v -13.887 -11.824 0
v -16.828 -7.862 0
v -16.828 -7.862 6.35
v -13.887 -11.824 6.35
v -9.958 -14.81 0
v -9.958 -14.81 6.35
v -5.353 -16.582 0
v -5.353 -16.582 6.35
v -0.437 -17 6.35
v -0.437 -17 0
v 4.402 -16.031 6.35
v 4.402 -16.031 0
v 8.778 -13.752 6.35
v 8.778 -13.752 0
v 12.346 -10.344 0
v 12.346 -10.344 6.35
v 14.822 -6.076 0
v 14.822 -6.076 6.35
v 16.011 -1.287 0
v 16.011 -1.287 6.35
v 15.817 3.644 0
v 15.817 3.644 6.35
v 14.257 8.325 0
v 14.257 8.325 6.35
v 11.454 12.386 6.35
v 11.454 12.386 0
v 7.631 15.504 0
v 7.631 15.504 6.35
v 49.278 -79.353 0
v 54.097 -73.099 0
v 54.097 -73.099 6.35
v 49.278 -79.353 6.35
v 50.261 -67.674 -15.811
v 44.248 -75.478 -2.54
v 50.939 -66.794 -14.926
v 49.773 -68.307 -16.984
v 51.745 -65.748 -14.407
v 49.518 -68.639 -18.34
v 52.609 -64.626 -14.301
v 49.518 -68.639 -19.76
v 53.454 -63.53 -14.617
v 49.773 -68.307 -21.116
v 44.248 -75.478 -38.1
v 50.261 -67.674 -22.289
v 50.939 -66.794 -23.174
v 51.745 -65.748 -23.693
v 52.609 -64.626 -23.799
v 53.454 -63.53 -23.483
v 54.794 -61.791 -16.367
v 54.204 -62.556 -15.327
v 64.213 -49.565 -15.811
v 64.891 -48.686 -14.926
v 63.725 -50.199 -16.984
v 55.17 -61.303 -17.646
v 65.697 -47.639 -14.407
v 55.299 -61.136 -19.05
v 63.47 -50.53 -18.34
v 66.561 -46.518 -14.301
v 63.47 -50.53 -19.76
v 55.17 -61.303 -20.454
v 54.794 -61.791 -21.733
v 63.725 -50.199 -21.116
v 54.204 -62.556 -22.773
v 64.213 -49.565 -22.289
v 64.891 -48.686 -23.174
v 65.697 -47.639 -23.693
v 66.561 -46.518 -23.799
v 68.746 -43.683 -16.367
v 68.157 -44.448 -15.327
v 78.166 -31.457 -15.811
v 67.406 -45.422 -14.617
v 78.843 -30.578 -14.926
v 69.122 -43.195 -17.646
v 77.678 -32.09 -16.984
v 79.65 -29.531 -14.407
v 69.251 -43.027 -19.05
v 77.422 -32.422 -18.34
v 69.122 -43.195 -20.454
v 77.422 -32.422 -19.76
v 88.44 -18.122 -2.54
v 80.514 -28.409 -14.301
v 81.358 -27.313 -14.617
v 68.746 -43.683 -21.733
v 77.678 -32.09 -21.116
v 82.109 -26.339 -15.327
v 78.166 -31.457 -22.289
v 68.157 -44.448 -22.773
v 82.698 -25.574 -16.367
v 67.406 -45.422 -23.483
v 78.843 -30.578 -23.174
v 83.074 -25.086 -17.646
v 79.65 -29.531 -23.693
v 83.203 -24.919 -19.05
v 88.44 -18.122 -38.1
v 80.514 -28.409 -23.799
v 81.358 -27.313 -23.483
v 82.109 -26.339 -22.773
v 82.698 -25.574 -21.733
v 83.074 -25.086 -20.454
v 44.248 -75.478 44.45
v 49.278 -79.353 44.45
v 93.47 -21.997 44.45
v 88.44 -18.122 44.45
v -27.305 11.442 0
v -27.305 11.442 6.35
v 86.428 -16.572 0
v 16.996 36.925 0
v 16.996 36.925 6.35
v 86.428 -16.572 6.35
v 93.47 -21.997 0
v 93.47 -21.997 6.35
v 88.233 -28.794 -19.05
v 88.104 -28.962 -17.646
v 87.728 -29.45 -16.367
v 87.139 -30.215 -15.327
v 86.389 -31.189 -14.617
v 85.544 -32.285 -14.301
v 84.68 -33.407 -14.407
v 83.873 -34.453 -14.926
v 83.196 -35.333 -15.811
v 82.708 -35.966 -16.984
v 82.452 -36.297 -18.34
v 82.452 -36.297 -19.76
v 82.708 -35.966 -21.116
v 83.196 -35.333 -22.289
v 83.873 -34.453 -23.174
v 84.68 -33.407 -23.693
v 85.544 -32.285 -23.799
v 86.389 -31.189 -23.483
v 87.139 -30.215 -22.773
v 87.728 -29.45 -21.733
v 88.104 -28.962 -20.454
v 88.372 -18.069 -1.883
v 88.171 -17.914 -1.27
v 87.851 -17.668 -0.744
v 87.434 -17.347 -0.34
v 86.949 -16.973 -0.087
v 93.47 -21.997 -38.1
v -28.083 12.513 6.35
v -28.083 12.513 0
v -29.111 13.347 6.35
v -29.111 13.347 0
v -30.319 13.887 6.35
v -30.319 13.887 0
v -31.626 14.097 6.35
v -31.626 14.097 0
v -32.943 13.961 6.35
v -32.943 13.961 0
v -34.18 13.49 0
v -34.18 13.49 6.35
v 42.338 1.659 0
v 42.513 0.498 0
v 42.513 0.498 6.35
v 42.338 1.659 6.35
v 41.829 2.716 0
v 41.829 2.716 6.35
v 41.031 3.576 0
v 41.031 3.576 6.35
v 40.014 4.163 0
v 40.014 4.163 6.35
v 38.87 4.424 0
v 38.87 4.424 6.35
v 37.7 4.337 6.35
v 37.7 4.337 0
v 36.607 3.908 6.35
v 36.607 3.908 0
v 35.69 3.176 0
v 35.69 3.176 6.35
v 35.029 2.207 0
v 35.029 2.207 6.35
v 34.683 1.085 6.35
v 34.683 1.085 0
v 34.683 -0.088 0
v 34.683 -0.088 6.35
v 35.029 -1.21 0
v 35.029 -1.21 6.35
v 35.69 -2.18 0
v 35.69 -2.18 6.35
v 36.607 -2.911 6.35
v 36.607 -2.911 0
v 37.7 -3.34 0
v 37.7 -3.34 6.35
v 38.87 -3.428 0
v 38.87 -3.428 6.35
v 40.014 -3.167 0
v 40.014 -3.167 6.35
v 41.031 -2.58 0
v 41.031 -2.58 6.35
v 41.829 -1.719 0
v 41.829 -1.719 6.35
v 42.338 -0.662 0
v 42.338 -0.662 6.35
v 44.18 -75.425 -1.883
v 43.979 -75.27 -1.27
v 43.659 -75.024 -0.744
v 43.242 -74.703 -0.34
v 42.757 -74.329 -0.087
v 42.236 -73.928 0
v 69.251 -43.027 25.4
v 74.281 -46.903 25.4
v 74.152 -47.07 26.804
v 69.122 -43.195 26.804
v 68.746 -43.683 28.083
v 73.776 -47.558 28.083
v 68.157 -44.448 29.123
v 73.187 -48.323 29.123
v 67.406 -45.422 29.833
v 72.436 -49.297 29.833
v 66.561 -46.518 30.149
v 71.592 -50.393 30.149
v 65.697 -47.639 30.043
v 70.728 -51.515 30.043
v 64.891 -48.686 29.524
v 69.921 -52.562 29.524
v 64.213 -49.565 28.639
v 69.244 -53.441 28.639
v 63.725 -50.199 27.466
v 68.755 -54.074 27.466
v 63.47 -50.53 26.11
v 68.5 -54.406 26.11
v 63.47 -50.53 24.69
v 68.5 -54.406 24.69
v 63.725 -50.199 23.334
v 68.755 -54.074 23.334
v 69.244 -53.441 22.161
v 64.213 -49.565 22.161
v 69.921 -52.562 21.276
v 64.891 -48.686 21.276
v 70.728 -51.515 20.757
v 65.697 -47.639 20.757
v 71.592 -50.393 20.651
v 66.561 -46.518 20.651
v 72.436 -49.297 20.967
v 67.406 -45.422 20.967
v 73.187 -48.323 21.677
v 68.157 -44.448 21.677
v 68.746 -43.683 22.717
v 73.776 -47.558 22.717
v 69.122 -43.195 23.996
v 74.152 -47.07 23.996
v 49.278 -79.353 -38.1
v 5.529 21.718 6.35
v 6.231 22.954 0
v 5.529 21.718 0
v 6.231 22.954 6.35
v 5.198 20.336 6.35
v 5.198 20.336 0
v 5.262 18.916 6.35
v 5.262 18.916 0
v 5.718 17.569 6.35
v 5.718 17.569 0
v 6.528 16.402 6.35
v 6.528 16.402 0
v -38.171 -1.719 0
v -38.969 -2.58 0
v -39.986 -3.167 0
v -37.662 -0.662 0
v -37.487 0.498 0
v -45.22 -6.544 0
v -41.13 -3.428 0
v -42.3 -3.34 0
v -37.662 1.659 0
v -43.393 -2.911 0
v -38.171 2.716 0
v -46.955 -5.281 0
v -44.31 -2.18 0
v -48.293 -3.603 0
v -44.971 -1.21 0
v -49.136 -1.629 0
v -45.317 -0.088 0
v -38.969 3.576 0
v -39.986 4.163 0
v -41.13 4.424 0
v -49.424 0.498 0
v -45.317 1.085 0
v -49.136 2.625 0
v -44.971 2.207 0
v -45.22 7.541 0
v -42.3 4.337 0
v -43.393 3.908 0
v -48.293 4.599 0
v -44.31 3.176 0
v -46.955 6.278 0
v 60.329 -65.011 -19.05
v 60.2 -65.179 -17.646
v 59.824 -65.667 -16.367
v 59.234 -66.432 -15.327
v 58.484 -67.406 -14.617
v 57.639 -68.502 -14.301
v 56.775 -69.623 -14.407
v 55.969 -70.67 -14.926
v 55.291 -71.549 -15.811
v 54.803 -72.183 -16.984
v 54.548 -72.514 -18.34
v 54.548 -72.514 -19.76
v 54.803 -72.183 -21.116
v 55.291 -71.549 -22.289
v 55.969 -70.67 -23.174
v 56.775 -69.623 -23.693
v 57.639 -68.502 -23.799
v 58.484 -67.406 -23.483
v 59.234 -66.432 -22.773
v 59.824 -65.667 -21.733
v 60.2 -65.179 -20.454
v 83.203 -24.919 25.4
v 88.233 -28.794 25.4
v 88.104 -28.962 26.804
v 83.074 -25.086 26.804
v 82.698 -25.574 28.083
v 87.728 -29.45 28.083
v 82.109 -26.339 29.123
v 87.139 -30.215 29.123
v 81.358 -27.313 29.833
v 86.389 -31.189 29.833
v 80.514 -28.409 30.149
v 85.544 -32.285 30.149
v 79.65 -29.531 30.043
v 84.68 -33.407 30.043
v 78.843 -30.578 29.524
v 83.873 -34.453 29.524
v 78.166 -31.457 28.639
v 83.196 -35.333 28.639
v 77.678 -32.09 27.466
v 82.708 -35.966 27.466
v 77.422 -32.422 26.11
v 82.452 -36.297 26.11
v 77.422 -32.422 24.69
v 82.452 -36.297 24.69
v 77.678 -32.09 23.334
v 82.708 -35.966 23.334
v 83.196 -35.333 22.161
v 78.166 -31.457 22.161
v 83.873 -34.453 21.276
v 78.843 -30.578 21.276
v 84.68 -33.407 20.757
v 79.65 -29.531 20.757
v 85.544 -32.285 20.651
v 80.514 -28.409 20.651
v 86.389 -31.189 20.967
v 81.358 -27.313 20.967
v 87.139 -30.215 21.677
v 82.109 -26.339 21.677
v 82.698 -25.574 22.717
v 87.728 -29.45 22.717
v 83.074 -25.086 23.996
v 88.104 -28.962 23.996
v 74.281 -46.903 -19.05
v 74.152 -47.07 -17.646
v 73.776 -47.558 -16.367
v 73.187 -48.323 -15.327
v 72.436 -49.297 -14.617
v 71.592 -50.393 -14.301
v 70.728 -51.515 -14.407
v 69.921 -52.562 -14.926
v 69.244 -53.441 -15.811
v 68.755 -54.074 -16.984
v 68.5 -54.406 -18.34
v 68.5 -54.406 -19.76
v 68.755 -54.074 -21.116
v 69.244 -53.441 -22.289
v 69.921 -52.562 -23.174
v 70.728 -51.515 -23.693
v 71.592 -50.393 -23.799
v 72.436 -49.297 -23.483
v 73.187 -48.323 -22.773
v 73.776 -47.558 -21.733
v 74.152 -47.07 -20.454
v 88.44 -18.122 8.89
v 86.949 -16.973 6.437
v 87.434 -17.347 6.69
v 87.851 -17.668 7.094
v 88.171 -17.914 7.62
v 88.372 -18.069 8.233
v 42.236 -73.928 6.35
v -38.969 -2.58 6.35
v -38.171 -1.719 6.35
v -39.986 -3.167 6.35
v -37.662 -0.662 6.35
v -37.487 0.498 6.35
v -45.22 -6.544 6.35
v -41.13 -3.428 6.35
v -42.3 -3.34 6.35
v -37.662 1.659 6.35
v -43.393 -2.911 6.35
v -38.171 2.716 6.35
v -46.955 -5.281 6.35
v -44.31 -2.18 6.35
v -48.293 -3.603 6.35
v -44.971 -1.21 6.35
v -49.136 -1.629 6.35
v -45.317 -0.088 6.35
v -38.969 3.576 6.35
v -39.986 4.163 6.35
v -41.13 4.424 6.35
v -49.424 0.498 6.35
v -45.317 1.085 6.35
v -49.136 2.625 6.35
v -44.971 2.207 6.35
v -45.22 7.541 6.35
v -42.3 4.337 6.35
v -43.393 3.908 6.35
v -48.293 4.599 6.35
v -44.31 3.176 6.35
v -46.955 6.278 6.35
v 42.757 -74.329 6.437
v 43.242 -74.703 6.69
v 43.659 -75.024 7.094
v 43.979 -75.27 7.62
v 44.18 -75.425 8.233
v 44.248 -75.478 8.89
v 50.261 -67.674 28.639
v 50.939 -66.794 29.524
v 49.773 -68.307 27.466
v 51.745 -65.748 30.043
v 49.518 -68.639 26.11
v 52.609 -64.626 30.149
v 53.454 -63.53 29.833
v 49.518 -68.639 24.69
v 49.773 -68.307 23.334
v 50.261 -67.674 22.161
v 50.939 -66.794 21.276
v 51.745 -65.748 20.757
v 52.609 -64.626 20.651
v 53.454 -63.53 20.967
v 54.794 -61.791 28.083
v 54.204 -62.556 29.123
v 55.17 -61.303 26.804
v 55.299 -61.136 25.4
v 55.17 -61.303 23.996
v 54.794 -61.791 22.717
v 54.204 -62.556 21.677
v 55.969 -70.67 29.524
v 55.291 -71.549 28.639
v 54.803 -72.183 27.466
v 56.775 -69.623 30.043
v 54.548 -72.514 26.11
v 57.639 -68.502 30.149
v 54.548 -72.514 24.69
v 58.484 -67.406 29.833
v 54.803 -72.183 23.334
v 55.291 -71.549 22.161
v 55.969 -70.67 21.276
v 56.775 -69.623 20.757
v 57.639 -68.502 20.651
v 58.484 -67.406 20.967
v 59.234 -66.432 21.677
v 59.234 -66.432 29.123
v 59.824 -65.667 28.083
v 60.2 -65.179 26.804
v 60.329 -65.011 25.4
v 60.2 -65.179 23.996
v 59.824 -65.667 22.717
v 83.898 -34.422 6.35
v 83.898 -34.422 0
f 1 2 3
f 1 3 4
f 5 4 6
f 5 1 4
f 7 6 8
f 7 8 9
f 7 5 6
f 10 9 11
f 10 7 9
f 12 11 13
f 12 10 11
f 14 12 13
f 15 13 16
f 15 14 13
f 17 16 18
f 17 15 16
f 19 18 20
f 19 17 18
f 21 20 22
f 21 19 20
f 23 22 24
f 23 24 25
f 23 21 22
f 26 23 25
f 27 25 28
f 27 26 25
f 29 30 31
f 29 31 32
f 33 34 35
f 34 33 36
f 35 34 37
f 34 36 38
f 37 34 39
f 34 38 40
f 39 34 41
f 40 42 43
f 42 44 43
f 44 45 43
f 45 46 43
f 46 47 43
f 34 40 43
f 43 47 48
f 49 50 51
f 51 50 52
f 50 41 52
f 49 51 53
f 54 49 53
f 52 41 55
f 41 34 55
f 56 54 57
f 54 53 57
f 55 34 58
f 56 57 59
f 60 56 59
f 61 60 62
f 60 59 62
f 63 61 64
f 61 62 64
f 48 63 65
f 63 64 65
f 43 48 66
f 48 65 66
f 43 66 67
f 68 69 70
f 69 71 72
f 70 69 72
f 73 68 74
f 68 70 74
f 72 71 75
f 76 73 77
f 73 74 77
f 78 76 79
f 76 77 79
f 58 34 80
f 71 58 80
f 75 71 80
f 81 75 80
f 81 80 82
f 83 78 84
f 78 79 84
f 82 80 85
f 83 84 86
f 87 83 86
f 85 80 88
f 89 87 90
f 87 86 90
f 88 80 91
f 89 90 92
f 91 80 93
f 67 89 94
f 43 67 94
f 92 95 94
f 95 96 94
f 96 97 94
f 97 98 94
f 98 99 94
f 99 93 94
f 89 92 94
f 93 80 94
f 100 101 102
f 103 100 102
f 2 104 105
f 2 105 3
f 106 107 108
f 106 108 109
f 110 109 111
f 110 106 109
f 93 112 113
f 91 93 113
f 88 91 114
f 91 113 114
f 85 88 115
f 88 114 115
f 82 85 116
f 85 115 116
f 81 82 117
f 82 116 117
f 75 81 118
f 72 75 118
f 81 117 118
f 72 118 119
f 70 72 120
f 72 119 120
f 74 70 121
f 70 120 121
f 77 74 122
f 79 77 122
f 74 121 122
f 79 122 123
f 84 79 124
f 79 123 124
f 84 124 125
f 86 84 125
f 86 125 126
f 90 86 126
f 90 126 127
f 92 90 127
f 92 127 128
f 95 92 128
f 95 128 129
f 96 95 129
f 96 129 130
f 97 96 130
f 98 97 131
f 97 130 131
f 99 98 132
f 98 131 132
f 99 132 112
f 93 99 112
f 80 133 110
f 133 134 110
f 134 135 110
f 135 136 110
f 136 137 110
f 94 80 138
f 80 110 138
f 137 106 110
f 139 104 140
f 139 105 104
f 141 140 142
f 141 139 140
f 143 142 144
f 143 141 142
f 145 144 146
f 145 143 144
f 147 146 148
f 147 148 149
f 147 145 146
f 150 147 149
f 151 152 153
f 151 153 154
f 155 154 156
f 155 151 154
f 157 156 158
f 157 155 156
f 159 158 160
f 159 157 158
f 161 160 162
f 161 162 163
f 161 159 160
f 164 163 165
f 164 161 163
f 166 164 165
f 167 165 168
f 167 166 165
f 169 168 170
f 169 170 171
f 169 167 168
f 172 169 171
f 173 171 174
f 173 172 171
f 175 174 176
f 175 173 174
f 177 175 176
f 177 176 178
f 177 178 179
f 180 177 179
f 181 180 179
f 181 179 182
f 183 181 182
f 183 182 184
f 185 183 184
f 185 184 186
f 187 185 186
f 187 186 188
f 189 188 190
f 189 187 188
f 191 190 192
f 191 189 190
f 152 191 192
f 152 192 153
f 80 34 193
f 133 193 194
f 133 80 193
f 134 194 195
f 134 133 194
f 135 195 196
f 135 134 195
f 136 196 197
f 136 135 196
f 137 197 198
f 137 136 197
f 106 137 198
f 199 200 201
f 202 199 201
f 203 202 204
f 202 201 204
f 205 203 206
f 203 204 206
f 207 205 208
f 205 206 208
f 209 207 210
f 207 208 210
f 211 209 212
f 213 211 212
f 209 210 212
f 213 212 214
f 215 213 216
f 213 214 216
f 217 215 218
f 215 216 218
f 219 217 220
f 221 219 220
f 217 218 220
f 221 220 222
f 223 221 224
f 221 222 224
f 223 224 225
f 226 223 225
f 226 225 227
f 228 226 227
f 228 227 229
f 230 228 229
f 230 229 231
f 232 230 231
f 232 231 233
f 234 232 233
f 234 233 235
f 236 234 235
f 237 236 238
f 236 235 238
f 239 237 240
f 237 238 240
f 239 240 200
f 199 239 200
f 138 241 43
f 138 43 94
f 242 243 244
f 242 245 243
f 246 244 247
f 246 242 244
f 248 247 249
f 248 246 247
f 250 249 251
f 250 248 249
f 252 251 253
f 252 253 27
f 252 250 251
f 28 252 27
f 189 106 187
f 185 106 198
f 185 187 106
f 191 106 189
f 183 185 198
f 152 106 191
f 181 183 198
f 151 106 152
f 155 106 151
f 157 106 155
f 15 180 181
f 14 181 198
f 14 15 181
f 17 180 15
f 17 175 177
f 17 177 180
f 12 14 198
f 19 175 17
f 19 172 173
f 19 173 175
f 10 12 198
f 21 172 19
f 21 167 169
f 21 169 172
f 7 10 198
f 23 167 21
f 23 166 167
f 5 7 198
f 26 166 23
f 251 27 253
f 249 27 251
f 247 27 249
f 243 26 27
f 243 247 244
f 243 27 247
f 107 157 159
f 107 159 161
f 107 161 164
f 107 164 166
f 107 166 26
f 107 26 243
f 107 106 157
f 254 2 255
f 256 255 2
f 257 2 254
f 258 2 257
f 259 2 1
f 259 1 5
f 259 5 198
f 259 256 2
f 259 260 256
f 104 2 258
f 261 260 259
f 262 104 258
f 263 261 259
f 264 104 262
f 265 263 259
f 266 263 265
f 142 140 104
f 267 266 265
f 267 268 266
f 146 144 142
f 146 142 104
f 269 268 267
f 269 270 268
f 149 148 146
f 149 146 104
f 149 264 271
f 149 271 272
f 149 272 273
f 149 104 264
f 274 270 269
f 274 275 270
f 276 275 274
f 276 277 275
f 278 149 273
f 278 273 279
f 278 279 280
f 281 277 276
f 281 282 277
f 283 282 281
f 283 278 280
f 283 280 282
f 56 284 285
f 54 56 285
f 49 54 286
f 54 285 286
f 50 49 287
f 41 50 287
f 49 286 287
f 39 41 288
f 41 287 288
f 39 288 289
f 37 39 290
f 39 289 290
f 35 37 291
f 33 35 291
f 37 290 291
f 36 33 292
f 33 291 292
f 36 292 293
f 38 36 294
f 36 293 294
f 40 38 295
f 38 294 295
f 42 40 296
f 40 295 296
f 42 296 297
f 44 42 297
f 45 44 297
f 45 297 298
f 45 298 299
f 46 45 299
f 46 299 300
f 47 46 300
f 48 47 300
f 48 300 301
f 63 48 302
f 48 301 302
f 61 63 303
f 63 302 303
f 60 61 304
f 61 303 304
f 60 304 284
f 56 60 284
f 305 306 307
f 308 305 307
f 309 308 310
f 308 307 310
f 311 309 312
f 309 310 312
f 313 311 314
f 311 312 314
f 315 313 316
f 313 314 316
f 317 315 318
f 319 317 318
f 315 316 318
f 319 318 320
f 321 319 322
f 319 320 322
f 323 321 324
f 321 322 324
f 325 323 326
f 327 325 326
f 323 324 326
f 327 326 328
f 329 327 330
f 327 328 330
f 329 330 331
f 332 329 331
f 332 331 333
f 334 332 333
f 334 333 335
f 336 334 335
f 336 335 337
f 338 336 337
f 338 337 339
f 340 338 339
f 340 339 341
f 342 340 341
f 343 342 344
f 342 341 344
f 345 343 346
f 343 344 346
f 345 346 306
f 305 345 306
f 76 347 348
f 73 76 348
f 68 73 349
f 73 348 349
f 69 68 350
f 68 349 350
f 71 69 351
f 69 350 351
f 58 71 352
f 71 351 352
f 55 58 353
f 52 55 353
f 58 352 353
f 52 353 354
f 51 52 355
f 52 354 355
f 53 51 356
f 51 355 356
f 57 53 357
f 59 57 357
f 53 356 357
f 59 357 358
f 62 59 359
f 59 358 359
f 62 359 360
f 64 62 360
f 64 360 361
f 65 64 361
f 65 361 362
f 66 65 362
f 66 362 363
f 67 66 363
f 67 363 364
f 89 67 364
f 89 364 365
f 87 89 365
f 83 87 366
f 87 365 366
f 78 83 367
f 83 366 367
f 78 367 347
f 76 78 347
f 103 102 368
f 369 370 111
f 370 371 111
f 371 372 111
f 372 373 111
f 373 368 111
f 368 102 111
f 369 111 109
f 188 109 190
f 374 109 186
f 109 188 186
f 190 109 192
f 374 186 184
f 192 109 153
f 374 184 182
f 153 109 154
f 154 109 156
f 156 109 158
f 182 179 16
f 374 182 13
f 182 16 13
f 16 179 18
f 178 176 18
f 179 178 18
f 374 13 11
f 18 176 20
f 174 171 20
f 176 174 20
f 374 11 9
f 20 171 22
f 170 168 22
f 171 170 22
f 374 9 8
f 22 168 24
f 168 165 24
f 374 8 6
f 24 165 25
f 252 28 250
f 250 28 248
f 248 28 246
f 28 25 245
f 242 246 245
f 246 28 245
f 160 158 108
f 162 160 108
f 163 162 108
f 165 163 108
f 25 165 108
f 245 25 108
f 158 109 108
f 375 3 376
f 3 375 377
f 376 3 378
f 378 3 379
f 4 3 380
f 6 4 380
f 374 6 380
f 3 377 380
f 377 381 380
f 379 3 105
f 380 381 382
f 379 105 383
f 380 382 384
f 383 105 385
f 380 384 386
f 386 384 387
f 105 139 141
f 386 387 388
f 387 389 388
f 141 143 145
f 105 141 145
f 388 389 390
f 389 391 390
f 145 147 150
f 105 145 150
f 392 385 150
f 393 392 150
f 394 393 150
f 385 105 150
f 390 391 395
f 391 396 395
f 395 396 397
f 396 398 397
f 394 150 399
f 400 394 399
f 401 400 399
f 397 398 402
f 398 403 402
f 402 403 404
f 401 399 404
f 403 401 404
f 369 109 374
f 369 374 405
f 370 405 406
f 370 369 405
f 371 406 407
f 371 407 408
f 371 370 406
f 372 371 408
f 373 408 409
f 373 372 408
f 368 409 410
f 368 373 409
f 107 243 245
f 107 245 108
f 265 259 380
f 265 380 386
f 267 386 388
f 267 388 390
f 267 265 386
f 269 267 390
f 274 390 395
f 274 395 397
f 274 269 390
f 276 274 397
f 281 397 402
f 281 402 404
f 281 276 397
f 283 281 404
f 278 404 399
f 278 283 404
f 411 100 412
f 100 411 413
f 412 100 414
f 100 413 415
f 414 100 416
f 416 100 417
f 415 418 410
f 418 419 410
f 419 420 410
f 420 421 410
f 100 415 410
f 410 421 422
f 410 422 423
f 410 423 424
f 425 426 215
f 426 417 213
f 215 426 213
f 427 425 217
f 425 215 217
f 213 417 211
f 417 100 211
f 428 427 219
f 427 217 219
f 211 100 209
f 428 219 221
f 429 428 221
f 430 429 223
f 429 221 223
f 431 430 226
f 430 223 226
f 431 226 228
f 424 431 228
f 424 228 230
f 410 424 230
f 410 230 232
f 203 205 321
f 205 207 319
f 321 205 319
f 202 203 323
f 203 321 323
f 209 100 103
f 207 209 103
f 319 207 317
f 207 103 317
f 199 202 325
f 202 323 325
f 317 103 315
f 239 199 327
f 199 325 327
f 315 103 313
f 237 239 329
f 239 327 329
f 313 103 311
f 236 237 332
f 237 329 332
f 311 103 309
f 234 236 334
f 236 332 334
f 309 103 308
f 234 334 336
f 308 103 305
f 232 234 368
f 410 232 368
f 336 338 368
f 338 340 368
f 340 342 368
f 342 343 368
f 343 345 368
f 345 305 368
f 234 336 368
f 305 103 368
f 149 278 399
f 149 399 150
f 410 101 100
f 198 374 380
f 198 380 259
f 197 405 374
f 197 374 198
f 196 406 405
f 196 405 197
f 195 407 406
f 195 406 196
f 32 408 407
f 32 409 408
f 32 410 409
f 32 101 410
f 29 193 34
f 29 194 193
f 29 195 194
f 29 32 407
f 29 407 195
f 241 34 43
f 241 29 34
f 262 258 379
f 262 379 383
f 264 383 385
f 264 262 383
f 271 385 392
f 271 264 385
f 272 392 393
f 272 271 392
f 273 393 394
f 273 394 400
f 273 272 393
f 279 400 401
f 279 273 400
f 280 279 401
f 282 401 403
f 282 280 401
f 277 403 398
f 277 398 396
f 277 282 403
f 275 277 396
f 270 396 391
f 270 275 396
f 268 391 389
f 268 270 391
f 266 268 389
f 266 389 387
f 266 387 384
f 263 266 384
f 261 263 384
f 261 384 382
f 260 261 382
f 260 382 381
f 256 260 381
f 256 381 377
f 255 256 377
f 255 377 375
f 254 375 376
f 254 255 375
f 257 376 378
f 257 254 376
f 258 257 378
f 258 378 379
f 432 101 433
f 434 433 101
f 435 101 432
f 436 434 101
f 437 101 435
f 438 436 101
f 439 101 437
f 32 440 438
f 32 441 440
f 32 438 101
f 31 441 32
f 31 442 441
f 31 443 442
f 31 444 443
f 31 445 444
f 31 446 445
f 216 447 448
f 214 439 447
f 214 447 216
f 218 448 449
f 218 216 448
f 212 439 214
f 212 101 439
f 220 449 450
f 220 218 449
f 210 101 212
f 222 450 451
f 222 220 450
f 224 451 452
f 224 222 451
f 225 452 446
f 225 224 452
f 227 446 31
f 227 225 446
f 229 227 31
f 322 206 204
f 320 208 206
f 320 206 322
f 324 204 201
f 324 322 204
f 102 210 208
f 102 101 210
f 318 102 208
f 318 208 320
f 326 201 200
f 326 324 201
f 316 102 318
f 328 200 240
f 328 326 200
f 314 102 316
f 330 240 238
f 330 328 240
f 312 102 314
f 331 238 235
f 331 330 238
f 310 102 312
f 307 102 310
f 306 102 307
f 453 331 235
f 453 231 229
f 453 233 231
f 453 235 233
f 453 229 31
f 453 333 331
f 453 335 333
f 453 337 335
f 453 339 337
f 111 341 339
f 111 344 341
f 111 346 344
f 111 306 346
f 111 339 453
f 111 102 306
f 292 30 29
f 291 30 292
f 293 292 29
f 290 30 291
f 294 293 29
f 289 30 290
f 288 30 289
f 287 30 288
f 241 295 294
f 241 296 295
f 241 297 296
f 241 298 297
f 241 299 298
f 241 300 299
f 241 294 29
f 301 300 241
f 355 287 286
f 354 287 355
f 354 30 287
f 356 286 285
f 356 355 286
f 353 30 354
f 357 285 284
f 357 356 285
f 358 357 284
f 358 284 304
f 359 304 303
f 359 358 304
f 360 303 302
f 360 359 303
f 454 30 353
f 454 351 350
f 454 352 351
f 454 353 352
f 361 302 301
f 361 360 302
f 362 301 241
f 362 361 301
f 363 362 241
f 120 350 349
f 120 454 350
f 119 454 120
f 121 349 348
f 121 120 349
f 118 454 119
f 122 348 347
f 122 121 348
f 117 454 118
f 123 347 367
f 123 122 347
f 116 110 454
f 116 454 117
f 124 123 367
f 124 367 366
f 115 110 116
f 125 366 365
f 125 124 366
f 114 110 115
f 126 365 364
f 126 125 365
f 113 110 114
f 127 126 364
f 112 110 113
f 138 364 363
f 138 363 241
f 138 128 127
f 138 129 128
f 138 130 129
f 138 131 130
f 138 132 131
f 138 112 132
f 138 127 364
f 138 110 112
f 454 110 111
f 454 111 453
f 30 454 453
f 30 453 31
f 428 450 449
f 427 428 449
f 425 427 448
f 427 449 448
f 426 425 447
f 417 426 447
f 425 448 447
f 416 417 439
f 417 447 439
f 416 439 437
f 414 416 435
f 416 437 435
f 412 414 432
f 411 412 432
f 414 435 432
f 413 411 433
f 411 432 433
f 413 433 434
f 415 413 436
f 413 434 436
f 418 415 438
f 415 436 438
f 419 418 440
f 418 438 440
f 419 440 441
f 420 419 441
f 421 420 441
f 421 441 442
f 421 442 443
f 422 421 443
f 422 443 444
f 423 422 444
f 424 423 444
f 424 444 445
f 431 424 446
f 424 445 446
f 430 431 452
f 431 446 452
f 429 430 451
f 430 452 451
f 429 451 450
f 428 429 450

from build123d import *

# Parameters (mm, degrees)
SKETCH1_R           = 3.937
BOSS_EXTRUDE1_DEPTH = 6.35
SKETCH2_W           = 38.1
SKETCH2_H           = 72.406172823
SKETCH2_R           = 4.7625
BOSS_EXTRUDE2_DEPTH = 6.35
FILLET1_R           = 2.54
FILLET2_R           = 5.08


with BuildPart() as part:
    # Sketch1 → Boss-Extrude1 (new body)
    with BuildSketch(Plane.XY):
        with BuildLine():
            ThreePointArc((-16.827513409, -7.862086917), (12.639466563, -9.959944911), (2.148977793, 17.656238065))
            Line((2.148977793, 17.656238065), (16.995641365, 36.92542525))
            Line((16.995641365, 36.92542525), (93.470395294, -21.997399694))
            Line((93.470395294, -21.997399694), (83.897723102, -34.421579135))
            Line((83.897723102, -34.421579135), (54.096930983, -73.099430143))
            Line((54.096930983, -73.099430143), (49.278309192, -79.35342282))
            Line((49.278309192, -79.35342282), (-45.219558371, -6.544018121))
            ThreePointArc((-45.219558371, -6.544018121), (-49.424138371, 0.498338517), (-45.219558371, 7.540695156))
            Line((-45.219558371, 7.540695156), (-29.721187426, 15.893414291))
            Line((-29.721187426, 15.893414291), (-16.827513409, -7.862086917))
        make_face()
        with Locations((-41.424138371, 0.498338517)):
            Circle(SKETCH1_R, mode=Mode.SUBTRACT)
        with Locations((38.575861629, 0.498338517)):
            Circle(SKETCH1_R, mode=Mode.SUBTRACT)
    extrude(amount=BOSS_EXTRUDE1_DEPTH)

    # Sketch2 → Boss-Extrude2 (add)
    # profile 1 of 2: a face of its own
    with BuildSketch(Plane(origin=(69.2868994, -53.384674478, 0), x_dir=(0, 0, -1), z_dir=(0.7921427260999971, -0.6103358923468823, 0))):
        with Locations((19.05, 3.420170547)):
            Rectangle(SKETCH2_W, SKETCH2_H)
        with Locations(Location((19.05, 26.280170547, 0), (0, 0, 90))):
            Circle(SKETCH2_R, mode=Mode.SUBTRACT)
        with Locations(Location((19.05, -19.439829453, 0), (0, 0, 90))):
            Circle(SKETCH2_R, mode=Mode.SUBTRACT)
        with Locations(Location((19.05, 3.420170547, 0), (0, 0, 90))):
            Circle(SKETCH2_R, mode=Mode.SUBTRACT)
    # profile 2 of 2: a face of its own
    with BuildSketch(Plane(origin=(69.2868994, -53.384674478, 0), x_dir=(0, 0, -1), z_dir=(0.7921427260999971, -0.6103358923468823, 0))):
        with Locations((-25.4, 3.420170547)):
            Rectangle(SKETCH2_W, SKETCH2_H)
        with Locations(Location((-25.4, -19.439829453, 0), (0, 0, 90))):
            Circle(SKETCH2_R, mode=Mode.SUBTRACT)
        with Locations(Location((-25.4, 26.280170547, 0), (0, 0, 90))):
            Circle(SKETCH2_R, mode=Mode.SUBTRACT)
        with Locations(Location((-25.4, 3.420170547, 0), (0, 0, 90))):
            Circle(SKETCH2_R, mode=Mode.SUBTRACT)
    extrude(amount=-BOSS_EXTRUDE2_DEPTH)

    # Fillet1
    fillet1_edges = [part.edges().sort_by_distance(p)[0] for p in [
        (66.344245932, -46.799778341, 0),
        (66.344245932, -46.799778341, 6.35),
    ]]
    fillet(fillet1_edges, radius=FILLET1_R)

    # Fillet2
    fillet2_edges = [part.edges().sort_by_distance(p)[0] for p in [
        (2.148977793, 17.656238065, 3.175),
        (-29.721187426, 15.893414291, 3.175),
    ]]
    fillet(fillet2_edges, radius=FILLET2_R)


solid = part.part
